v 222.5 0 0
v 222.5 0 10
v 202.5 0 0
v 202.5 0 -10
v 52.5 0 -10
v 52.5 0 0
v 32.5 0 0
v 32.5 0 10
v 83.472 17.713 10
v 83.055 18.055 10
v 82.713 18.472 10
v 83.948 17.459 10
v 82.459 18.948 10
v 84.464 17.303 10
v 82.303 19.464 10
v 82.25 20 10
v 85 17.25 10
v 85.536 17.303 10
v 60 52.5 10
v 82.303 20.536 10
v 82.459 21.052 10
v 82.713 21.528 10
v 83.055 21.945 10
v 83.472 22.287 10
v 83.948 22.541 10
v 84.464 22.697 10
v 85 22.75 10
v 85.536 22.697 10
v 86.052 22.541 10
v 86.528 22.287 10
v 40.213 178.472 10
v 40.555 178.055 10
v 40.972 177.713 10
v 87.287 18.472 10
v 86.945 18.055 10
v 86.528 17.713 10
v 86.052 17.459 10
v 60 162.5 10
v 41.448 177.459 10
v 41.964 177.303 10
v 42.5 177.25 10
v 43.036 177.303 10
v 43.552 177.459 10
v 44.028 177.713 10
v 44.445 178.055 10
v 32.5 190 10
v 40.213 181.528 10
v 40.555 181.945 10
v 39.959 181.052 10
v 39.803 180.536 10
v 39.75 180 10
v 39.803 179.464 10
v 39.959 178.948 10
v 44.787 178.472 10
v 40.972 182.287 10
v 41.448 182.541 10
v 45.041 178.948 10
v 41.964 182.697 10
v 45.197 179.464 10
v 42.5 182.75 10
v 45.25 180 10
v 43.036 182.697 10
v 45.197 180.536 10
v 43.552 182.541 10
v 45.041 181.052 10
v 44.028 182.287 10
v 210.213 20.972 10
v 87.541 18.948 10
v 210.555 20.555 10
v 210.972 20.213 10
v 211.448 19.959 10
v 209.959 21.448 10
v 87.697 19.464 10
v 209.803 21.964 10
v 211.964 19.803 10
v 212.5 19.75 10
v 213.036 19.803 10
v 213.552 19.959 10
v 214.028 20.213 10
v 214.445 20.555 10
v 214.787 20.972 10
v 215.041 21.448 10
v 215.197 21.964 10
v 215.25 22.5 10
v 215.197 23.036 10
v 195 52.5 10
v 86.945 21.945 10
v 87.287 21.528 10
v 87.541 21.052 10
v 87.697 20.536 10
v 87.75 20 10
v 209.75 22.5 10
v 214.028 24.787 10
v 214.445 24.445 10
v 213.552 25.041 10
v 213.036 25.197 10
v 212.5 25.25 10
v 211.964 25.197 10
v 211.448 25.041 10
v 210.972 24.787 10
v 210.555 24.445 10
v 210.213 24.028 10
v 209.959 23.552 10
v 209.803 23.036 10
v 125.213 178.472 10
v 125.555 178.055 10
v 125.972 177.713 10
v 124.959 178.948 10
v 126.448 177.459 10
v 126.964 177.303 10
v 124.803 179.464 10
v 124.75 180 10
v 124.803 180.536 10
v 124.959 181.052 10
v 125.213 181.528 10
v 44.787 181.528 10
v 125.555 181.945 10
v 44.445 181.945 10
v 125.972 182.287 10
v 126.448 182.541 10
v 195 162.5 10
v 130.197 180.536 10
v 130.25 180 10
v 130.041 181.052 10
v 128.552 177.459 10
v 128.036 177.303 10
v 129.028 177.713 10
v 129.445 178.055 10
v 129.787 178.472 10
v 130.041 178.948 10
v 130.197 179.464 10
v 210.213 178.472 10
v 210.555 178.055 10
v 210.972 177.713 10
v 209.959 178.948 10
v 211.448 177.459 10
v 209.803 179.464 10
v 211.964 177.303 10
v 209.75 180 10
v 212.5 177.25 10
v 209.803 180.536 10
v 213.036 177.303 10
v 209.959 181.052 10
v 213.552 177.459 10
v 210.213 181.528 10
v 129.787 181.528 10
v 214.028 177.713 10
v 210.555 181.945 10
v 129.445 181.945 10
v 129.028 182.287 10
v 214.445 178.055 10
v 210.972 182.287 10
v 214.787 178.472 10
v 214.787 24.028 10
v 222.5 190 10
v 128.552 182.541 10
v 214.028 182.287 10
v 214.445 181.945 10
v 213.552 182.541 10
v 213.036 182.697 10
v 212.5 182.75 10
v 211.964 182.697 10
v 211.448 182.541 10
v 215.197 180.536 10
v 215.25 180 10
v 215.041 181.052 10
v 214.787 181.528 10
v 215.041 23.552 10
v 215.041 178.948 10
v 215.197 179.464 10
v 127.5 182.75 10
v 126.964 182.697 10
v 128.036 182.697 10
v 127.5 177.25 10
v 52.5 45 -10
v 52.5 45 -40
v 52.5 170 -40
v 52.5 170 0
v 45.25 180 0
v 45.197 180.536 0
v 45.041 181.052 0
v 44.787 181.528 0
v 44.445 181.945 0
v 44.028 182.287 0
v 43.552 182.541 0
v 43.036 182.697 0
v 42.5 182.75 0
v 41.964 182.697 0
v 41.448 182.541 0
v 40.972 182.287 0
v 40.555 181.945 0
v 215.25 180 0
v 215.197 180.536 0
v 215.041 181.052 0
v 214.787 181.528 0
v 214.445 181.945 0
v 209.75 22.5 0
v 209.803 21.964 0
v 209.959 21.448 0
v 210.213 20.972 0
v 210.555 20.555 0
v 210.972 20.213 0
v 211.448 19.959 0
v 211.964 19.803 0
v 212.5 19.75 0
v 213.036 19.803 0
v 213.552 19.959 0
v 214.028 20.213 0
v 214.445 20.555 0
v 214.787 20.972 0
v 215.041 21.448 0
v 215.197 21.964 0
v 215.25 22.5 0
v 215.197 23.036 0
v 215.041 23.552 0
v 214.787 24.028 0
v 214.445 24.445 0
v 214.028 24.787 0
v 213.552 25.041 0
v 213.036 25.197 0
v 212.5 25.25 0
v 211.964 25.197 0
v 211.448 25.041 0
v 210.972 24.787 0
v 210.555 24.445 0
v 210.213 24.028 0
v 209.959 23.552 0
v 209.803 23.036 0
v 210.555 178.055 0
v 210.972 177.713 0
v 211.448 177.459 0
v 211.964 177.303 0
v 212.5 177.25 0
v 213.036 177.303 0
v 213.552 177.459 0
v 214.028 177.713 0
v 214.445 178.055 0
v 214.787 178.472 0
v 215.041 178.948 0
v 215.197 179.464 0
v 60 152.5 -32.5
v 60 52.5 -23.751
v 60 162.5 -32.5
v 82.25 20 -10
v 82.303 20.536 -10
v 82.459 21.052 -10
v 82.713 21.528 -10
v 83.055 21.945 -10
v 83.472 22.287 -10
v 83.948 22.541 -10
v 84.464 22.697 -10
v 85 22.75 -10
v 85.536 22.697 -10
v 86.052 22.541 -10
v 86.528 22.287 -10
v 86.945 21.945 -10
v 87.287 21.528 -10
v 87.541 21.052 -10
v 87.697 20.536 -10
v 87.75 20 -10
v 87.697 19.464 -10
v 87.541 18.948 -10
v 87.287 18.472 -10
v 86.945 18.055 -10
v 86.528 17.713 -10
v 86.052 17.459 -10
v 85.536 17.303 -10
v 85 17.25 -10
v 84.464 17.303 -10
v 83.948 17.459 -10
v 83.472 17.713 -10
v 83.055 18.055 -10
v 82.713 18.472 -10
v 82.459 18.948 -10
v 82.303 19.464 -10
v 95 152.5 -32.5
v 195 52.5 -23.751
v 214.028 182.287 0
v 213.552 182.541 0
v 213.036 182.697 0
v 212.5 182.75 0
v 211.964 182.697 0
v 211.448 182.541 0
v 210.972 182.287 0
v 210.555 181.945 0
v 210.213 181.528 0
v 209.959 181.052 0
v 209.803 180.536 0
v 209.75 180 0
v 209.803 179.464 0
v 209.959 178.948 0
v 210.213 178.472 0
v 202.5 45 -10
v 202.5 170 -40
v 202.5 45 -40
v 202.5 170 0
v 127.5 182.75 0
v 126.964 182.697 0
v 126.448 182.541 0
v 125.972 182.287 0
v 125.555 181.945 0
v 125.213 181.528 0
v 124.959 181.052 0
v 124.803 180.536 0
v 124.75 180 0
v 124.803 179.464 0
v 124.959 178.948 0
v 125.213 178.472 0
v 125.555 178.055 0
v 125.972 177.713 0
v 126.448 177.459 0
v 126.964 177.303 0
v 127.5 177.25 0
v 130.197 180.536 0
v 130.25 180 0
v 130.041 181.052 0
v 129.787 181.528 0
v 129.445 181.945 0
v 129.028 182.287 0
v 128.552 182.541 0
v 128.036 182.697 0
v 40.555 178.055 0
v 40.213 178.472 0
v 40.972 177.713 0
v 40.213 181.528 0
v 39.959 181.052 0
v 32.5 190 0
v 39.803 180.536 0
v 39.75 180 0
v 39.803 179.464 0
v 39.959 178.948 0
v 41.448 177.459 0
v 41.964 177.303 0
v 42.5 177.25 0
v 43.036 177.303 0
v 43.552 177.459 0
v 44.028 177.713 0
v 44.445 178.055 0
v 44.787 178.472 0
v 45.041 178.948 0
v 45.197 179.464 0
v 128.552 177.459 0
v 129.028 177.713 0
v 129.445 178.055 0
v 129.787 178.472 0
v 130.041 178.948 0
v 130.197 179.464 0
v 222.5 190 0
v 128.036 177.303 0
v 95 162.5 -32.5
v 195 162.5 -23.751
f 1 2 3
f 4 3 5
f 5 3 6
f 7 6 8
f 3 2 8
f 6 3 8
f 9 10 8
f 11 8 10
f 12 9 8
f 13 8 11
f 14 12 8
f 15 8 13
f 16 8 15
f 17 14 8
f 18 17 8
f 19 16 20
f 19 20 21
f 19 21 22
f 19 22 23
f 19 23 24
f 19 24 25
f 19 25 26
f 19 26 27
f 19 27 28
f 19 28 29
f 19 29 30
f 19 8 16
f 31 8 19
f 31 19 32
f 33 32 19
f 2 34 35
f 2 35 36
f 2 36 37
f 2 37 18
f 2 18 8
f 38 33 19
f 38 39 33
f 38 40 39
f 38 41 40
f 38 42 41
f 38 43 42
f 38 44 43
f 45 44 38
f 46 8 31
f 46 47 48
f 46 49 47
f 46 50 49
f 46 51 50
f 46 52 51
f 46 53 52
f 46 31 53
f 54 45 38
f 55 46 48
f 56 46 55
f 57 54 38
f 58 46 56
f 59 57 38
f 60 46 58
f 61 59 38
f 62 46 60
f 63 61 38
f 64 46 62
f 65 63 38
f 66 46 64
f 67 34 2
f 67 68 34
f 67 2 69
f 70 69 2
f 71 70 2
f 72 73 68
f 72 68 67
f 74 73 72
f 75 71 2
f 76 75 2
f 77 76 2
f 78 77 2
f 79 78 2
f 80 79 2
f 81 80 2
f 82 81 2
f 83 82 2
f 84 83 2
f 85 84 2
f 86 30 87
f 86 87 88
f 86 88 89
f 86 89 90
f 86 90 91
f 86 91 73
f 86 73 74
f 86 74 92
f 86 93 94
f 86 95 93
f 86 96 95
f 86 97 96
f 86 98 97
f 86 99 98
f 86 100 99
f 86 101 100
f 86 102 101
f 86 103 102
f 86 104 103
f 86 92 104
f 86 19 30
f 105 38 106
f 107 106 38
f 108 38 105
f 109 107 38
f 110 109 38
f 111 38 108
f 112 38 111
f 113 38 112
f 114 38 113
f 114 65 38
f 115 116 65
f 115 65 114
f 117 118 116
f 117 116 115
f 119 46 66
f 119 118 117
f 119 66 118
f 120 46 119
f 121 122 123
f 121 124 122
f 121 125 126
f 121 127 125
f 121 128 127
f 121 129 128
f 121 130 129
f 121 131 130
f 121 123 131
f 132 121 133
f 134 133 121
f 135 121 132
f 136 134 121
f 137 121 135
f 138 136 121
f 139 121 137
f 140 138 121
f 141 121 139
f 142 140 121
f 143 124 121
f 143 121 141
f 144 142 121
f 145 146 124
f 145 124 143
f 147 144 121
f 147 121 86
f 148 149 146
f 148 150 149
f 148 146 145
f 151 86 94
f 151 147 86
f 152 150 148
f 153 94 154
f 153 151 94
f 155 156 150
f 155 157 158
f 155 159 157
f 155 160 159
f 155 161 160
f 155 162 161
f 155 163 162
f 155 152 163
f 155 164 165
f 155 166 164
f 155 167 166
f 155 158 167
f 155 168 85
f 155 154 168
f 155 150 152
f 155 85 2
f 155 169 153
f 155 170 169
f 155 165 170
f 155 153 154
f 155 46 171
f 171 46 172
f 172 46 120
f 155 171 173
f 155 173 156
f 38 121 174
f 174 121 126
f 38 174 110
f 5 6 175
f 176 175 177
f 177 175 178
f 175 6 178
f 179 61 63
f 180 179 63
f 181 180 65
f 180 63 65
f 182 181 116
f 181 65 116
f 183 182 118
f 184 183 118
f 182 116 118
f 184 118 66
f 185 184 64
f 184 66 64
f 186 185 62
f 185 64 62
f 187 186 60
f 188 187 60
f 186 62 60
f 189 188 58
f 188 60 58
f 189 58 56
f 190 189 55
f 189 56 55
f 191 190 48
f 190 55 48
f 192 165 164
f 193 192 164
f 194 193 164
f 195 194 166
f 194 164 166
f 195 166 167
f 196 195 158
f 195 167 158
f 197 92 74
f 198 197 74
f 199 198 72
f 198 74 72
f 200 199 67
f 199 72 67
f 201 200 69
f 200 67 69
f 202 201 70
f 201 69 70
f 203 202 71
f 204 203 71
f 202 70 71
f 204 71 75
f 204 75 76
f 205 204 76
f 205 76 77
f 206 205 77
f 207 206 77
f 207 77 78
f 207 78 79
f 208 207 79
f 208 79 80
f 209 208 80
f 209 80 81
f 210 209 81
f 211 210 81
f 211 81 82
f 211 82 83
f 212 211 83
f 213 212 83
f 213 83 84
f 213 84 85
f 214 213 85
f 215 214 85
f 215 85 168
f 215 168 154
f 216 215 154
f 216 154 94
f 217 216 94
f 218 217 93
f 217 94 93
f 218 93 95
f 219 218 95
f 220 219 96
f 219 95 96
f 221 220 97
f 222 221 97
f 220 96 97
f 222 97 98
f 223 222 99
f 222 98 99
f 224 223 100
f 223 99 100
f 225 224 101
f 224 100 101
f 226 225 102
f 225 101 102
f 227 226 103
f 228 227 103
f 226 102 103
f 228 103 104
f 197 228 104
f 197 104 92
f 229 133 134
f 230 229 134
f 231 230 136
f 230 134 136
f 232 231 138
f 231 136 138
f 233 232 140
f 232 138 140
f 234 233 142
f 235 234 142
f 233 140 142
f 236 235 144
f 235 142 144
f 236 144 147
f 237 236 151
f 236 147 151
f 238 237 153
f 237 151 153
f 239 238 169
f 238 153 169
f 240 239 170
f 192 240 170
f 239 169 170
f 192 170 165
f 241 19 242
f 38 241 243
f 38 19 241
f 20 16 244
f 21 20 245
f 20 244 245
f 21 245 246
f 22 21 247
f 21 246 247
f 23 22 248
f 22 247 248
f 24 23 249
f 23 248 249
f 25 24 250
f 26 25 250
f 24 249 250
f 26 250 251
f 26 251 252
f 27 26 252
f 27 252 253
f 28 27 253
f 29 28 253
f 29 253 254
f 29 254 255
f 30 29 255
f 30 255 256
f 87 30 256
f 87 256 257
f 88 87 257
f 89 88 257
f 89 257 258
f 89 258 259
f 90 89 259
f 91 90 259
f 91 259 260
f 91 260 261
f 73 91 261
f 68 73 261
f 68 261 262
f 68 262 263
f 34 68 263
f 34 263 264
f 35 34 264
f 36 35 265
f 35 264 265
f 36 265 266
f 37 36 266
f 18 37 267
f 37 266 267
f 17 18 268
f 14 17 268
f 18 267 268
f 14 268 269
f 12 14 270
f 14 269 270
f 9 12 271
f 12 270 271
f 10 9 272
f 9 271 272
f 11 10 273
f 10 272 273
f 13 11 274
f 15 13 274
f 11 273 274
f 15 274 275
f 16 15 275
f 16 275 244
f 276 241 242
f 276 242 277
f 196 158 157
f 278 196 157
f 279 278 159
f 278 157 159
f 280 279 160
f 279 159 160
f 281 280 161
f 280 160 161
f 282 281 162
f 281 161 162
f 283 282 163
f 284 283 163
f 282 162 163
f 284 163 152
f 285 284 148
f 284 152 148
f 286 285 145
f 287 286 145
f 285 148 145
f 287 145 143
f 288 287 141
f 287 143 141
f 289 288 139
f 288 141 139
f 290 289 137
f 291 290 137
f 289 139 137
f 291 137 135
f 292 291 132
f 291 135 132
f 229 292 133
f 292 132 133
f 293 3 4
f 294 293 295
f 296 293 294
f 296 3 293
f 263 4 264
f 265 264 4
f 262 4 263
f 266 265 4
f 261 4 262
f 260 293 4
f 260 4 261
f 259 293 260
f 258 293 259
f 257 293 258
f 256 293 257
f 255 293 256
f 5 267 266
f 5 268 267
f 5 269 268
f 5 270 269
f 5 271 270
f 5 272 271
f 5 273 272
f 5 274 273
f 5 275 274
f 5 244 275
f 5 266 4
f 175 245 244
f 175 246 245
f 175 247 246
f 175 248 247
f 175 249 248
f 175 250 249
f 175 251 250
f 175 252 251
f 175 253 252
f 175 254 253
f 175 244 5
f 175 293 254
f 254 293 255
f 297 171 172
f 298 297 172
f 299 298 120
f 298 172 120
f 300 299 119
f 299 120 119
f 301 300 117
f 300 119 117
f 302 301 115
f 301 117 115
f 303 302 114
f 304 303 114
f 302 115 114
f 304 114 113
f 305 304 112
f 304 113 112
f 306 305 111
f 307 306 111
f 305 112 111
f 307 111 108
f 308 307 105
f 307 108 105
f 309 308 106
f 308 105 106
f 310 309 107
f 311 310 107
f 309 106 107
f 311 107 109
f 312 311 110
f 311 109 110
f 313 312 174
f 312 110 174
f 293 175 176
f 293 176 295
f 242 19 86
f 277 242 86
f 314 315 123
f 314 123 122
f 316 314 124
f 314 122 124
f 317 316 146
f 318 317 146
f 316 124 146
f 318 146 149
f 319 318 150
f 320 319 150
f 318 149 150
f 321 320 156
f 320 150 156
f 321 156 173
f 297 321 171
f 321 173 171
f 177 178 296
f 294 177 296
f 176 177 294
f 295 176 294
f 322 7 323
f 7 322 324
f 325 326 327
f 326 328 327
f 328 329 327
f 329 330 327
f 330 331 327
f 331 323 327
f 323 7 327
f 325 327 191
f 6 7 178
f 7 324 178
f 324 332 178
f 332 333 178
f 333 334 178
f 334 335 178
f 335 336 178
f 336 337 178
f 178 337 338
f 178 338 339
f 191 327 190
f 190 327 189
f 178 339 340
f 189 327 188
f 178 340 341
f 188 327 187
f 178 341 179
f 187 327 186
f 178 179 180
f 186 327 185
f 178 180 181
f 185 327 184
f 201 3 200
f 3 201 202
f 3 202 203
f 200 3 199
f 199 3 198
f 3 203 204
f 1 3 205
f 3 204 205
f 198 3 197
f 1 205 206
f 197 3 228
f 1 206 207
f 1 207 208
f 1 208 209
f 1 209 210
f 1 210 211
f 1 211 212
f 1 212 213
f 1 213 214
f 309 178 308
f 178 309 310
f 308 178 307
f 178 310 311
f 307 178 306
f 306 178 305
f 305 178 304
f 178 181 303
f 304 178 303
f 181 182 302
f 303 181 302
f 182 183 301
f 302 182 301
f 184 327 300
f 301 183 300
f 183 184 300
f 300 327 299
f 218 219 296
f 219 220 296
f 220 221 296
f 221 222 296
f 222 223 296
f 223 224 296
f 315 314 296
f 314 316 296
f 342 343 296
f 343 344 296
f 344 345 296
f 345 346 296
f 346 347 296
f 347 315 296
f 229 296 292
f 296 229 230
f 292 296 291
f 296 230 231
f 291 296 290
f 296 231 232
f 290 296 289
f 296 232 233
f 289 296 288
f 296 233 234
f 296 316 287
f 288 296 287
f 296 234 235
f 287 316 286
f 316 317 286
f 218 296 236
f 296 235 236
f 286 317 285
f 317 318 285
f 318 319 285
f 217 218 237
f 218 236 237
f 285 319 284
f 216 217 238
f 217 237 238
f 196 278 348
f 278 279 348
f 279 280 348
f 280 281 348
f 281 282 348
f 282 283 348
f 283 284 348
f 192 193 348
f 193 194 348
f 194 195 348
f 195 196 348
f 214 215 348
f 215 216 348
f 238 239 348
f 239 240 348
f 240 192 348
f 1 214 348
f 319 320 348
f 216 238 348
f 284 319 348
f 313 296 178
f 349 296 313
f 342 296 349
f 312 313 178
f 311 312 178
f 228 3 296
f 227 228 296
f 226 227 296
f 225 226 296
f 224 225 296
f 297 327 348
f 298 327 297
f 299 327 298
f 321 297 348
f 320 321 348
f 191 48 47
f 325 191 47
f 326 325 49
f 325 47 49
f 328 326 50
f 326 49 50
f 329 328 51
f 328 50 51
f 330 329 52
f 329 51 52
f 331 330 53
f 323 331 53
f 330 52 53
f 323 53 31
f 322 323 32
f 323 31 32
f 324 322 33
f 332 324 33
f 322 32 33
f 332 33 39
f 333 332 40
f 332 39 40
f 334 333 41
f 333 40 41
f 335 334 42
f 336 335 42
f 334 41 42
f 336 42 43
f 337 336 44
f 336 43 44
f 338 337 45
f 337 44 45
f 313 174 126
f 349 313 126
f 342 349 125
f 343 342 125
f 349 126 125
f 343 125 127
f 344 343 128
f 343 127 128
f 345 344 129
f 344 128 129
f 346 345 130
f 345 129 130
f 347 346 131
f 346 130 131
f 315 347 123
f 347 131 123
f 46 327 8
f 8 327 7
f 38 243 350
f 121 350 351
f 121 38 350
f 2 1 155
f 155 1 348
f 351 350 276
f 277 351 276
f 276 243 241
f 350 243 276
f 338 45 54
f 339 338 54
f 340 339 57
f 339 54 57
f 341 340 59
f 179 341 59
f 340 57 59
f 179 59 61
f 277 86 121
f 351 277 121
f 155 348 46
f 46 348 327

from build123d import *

# Parameters (mm, degrees)
SKETCH1_W           = 150
SKETCH1_H           = 45
BOSS_EXTRUDE1_DEPTH = 10
SKETCH2_W           = 150
SKETCH2_H           = 45
BOSS_EXTRUDE2_DEPTH = 10
SKETCH3_R           = 2.75
CUT_EXTRUDE1_DEPTH  = 30
CUT_EXTRUDE2_DEPTH  = 30
CUT_EXTRUDE3_DEPTH  = 47
SKETCH7_W           = 150
SKETCH7_H           = 125
SKETCH7_W_2         = 135
SKETCH7_H_2         = 110
BOSS_EXTRUDE3_DEPTH = 50
SKETCH8_W           = 135
SKETCH8_H           = 7.5
BOSS_EXTRUDE4_DEPTH = 110
CHAMFER2_SIZE       = 100
CHAMFER2_SIZE2      = 8.748866353


with BuildPart() as part:
    # Sketch1 → Boss-Extrude1 (new body)
    with BuildSketch(Plane.XY):
        Polygon((52.5, 45), (52.5, 170), (202.5, 170), (202.5, 45), (202.5, 0), (222.5, 0), (222.5, 190), (32.5, 190), (32.5, 45), (32.5, 0), (52.5, 0), align=None)
        with Locations((127.5, 22.5)):
            Rectangle(SKETCH1_W, SKETCH1_H)
    extrude(amount=BOSS_EXTRUDE1_DEPTH)

    # Sketch2 → Boss-Extrude2 (add)
    with BuildSketch(Plane(origin=(0, 0, 0), x_dir=(-1, 0, 0), z_dir=(0, 0, -1))):
        with Locations((-127.5, 22.5)):
            Rectangle(SKETCH2_W, SKETCH2_H)
    extrude(amount=BOSS_EXTRUDE2_DEPTH)

    # Sketch3 → Cut-Extrude1 (cut)
    with BuildSketch(Plane(origin=(0, 0, -10), x_dir=(-1, 0, 0), z_dir=(0, 0, -1))):
        with Locations((-85, 20)):
            Circle(SKETCH3_R)
    extrude(amount=-CUT_EXTRUDE1_DEPTH, mode=Mode.SUBTRACT)

    # Sketch4 → Cut-Extrude2 (cut)
    with BuildSketch(Plane.XY.offset(10)):
        with BuildLine():
            ThreePointArc((40.555456352, 181.944543648), (40.555456352, 178.055456352), (44.444543648, 178.055456352))
            Line((44.444543648, 178.055456352), (40.555456352, 181.944543648))
        make_face()
        with BuildLine():
            Line((40.555456352, 181.944543648), (44.444543648, 178.055456352))
            ThreePointArc((44.444543648, 178.055456352), (45.040668714, 178.947620561), (45.25, 180))
            ThreePointArc((45.25, 180), (43.552379439, 182.540668714), (40.555456352, 181.944543648))
        make_face()
        with BuildLine():
            ThreePointArc((130.25, 180), (129.444543648, 181.944543648), (127.5, 182.75))
            Line((127.5, 182.75), (127.5, 177.25))
            ThreePointArc((127.5, 177.25), (129.444543648, 178.055456352), (130.25, 180))
        make_face()
        with BuildLine():
            Line((127.5, 177.25), (127.5, 182.75))
            ThreePointArc((127.5, 182.75), (124.75, 180), (127.5, 177.25))
        make_face()
        with BuildLine():
            ThreePointArc((214.444543648, 181.944543648), (210.555456352, 181.944543648), (210.555456352, 178.055456352))
            Line((210.555456352, 178.055456352), (214.444543648, 181.944543648))
        make_face()
        with BuildLine():
            Line((214.444543648, 181.944543648), (210.555456352, 178.055456352))
            ThreePointArc((210.555456352, 178.055456352), (213.552379439, 177.459331286), (215.25, 180))
            ThreePointArc((215.25, 180), (215.040668714, 181.052379439), (214.444543648, 181.944543648))
        make_face()
    extrude(amount=-CUT_EXTRUDE2_DEPTH, mode=Mode.SUBTRACT)

    # Sketch5 → Cut-Extrude3 (cut)
    with BuildSketch(Plane.XY.offset(10)):
        with BuildLine():
            ThreePointArc((215.25, 22.5), (212.5, 25.25), (209.75, 22.5))
            Line((209.75, 22.5), (215.25, 22.5))
        make_face()
        with BuildLine():
            Line((215.25, 22.5), (209.75, 22.5))
            ThreePointArc((209.75, 22.5), (212.5, 19.75), (215.25, 22.5))
        make_face()
    extrude(amount=-CUT_EXTRUDE3_DEPTH, mode=Mode.SUBTRACT)

    # Sketch7 → Boss-Extrude3 (add)
    with BuildSketch(Plane.XY.offset(10)):
        with Locations((127.5, 107.5)):
            Rectangle(SKETCH7_W, SKETCH7_H)
        with Locations((127.5, 107.5)):
            Rectangle(SKETCH7_W_2, SKETCH7_H_2, mode=Mode.SUBTRACT)
    extrude(amount=-BOSS_EXTRUDE3_DEPTH)

    # Sketch8 → Boss-Extrude4 (add)
    with BuildSketch(Plane.XZ.offset(-162.5)):
        with Locations((127.5, -36.25)):
            Rectangle(SKETCH8_W, SKETCH8_H)
    extrude(amount=BOSS_EXTRUDE4_DEPTH)

    # Chamfer2
    chamfer2_edges = [part.edges().sort_by_distance(p)[0] for p in [
        (195, 107.5, -32.5),
        (127.5, 52.5, -32.5),
    ]]
    chamfer2_side = [part.faces().sort_by_distance(p)[0] for p in [
        (127.5, 107.5, -32.5),
    ]]
    chamfer(chamfer2_edges, length=CHAMFER2_SIZE, length2=CHAMFER2_SIZE2, reference=chamfer2_side[0])


solid = part.part
